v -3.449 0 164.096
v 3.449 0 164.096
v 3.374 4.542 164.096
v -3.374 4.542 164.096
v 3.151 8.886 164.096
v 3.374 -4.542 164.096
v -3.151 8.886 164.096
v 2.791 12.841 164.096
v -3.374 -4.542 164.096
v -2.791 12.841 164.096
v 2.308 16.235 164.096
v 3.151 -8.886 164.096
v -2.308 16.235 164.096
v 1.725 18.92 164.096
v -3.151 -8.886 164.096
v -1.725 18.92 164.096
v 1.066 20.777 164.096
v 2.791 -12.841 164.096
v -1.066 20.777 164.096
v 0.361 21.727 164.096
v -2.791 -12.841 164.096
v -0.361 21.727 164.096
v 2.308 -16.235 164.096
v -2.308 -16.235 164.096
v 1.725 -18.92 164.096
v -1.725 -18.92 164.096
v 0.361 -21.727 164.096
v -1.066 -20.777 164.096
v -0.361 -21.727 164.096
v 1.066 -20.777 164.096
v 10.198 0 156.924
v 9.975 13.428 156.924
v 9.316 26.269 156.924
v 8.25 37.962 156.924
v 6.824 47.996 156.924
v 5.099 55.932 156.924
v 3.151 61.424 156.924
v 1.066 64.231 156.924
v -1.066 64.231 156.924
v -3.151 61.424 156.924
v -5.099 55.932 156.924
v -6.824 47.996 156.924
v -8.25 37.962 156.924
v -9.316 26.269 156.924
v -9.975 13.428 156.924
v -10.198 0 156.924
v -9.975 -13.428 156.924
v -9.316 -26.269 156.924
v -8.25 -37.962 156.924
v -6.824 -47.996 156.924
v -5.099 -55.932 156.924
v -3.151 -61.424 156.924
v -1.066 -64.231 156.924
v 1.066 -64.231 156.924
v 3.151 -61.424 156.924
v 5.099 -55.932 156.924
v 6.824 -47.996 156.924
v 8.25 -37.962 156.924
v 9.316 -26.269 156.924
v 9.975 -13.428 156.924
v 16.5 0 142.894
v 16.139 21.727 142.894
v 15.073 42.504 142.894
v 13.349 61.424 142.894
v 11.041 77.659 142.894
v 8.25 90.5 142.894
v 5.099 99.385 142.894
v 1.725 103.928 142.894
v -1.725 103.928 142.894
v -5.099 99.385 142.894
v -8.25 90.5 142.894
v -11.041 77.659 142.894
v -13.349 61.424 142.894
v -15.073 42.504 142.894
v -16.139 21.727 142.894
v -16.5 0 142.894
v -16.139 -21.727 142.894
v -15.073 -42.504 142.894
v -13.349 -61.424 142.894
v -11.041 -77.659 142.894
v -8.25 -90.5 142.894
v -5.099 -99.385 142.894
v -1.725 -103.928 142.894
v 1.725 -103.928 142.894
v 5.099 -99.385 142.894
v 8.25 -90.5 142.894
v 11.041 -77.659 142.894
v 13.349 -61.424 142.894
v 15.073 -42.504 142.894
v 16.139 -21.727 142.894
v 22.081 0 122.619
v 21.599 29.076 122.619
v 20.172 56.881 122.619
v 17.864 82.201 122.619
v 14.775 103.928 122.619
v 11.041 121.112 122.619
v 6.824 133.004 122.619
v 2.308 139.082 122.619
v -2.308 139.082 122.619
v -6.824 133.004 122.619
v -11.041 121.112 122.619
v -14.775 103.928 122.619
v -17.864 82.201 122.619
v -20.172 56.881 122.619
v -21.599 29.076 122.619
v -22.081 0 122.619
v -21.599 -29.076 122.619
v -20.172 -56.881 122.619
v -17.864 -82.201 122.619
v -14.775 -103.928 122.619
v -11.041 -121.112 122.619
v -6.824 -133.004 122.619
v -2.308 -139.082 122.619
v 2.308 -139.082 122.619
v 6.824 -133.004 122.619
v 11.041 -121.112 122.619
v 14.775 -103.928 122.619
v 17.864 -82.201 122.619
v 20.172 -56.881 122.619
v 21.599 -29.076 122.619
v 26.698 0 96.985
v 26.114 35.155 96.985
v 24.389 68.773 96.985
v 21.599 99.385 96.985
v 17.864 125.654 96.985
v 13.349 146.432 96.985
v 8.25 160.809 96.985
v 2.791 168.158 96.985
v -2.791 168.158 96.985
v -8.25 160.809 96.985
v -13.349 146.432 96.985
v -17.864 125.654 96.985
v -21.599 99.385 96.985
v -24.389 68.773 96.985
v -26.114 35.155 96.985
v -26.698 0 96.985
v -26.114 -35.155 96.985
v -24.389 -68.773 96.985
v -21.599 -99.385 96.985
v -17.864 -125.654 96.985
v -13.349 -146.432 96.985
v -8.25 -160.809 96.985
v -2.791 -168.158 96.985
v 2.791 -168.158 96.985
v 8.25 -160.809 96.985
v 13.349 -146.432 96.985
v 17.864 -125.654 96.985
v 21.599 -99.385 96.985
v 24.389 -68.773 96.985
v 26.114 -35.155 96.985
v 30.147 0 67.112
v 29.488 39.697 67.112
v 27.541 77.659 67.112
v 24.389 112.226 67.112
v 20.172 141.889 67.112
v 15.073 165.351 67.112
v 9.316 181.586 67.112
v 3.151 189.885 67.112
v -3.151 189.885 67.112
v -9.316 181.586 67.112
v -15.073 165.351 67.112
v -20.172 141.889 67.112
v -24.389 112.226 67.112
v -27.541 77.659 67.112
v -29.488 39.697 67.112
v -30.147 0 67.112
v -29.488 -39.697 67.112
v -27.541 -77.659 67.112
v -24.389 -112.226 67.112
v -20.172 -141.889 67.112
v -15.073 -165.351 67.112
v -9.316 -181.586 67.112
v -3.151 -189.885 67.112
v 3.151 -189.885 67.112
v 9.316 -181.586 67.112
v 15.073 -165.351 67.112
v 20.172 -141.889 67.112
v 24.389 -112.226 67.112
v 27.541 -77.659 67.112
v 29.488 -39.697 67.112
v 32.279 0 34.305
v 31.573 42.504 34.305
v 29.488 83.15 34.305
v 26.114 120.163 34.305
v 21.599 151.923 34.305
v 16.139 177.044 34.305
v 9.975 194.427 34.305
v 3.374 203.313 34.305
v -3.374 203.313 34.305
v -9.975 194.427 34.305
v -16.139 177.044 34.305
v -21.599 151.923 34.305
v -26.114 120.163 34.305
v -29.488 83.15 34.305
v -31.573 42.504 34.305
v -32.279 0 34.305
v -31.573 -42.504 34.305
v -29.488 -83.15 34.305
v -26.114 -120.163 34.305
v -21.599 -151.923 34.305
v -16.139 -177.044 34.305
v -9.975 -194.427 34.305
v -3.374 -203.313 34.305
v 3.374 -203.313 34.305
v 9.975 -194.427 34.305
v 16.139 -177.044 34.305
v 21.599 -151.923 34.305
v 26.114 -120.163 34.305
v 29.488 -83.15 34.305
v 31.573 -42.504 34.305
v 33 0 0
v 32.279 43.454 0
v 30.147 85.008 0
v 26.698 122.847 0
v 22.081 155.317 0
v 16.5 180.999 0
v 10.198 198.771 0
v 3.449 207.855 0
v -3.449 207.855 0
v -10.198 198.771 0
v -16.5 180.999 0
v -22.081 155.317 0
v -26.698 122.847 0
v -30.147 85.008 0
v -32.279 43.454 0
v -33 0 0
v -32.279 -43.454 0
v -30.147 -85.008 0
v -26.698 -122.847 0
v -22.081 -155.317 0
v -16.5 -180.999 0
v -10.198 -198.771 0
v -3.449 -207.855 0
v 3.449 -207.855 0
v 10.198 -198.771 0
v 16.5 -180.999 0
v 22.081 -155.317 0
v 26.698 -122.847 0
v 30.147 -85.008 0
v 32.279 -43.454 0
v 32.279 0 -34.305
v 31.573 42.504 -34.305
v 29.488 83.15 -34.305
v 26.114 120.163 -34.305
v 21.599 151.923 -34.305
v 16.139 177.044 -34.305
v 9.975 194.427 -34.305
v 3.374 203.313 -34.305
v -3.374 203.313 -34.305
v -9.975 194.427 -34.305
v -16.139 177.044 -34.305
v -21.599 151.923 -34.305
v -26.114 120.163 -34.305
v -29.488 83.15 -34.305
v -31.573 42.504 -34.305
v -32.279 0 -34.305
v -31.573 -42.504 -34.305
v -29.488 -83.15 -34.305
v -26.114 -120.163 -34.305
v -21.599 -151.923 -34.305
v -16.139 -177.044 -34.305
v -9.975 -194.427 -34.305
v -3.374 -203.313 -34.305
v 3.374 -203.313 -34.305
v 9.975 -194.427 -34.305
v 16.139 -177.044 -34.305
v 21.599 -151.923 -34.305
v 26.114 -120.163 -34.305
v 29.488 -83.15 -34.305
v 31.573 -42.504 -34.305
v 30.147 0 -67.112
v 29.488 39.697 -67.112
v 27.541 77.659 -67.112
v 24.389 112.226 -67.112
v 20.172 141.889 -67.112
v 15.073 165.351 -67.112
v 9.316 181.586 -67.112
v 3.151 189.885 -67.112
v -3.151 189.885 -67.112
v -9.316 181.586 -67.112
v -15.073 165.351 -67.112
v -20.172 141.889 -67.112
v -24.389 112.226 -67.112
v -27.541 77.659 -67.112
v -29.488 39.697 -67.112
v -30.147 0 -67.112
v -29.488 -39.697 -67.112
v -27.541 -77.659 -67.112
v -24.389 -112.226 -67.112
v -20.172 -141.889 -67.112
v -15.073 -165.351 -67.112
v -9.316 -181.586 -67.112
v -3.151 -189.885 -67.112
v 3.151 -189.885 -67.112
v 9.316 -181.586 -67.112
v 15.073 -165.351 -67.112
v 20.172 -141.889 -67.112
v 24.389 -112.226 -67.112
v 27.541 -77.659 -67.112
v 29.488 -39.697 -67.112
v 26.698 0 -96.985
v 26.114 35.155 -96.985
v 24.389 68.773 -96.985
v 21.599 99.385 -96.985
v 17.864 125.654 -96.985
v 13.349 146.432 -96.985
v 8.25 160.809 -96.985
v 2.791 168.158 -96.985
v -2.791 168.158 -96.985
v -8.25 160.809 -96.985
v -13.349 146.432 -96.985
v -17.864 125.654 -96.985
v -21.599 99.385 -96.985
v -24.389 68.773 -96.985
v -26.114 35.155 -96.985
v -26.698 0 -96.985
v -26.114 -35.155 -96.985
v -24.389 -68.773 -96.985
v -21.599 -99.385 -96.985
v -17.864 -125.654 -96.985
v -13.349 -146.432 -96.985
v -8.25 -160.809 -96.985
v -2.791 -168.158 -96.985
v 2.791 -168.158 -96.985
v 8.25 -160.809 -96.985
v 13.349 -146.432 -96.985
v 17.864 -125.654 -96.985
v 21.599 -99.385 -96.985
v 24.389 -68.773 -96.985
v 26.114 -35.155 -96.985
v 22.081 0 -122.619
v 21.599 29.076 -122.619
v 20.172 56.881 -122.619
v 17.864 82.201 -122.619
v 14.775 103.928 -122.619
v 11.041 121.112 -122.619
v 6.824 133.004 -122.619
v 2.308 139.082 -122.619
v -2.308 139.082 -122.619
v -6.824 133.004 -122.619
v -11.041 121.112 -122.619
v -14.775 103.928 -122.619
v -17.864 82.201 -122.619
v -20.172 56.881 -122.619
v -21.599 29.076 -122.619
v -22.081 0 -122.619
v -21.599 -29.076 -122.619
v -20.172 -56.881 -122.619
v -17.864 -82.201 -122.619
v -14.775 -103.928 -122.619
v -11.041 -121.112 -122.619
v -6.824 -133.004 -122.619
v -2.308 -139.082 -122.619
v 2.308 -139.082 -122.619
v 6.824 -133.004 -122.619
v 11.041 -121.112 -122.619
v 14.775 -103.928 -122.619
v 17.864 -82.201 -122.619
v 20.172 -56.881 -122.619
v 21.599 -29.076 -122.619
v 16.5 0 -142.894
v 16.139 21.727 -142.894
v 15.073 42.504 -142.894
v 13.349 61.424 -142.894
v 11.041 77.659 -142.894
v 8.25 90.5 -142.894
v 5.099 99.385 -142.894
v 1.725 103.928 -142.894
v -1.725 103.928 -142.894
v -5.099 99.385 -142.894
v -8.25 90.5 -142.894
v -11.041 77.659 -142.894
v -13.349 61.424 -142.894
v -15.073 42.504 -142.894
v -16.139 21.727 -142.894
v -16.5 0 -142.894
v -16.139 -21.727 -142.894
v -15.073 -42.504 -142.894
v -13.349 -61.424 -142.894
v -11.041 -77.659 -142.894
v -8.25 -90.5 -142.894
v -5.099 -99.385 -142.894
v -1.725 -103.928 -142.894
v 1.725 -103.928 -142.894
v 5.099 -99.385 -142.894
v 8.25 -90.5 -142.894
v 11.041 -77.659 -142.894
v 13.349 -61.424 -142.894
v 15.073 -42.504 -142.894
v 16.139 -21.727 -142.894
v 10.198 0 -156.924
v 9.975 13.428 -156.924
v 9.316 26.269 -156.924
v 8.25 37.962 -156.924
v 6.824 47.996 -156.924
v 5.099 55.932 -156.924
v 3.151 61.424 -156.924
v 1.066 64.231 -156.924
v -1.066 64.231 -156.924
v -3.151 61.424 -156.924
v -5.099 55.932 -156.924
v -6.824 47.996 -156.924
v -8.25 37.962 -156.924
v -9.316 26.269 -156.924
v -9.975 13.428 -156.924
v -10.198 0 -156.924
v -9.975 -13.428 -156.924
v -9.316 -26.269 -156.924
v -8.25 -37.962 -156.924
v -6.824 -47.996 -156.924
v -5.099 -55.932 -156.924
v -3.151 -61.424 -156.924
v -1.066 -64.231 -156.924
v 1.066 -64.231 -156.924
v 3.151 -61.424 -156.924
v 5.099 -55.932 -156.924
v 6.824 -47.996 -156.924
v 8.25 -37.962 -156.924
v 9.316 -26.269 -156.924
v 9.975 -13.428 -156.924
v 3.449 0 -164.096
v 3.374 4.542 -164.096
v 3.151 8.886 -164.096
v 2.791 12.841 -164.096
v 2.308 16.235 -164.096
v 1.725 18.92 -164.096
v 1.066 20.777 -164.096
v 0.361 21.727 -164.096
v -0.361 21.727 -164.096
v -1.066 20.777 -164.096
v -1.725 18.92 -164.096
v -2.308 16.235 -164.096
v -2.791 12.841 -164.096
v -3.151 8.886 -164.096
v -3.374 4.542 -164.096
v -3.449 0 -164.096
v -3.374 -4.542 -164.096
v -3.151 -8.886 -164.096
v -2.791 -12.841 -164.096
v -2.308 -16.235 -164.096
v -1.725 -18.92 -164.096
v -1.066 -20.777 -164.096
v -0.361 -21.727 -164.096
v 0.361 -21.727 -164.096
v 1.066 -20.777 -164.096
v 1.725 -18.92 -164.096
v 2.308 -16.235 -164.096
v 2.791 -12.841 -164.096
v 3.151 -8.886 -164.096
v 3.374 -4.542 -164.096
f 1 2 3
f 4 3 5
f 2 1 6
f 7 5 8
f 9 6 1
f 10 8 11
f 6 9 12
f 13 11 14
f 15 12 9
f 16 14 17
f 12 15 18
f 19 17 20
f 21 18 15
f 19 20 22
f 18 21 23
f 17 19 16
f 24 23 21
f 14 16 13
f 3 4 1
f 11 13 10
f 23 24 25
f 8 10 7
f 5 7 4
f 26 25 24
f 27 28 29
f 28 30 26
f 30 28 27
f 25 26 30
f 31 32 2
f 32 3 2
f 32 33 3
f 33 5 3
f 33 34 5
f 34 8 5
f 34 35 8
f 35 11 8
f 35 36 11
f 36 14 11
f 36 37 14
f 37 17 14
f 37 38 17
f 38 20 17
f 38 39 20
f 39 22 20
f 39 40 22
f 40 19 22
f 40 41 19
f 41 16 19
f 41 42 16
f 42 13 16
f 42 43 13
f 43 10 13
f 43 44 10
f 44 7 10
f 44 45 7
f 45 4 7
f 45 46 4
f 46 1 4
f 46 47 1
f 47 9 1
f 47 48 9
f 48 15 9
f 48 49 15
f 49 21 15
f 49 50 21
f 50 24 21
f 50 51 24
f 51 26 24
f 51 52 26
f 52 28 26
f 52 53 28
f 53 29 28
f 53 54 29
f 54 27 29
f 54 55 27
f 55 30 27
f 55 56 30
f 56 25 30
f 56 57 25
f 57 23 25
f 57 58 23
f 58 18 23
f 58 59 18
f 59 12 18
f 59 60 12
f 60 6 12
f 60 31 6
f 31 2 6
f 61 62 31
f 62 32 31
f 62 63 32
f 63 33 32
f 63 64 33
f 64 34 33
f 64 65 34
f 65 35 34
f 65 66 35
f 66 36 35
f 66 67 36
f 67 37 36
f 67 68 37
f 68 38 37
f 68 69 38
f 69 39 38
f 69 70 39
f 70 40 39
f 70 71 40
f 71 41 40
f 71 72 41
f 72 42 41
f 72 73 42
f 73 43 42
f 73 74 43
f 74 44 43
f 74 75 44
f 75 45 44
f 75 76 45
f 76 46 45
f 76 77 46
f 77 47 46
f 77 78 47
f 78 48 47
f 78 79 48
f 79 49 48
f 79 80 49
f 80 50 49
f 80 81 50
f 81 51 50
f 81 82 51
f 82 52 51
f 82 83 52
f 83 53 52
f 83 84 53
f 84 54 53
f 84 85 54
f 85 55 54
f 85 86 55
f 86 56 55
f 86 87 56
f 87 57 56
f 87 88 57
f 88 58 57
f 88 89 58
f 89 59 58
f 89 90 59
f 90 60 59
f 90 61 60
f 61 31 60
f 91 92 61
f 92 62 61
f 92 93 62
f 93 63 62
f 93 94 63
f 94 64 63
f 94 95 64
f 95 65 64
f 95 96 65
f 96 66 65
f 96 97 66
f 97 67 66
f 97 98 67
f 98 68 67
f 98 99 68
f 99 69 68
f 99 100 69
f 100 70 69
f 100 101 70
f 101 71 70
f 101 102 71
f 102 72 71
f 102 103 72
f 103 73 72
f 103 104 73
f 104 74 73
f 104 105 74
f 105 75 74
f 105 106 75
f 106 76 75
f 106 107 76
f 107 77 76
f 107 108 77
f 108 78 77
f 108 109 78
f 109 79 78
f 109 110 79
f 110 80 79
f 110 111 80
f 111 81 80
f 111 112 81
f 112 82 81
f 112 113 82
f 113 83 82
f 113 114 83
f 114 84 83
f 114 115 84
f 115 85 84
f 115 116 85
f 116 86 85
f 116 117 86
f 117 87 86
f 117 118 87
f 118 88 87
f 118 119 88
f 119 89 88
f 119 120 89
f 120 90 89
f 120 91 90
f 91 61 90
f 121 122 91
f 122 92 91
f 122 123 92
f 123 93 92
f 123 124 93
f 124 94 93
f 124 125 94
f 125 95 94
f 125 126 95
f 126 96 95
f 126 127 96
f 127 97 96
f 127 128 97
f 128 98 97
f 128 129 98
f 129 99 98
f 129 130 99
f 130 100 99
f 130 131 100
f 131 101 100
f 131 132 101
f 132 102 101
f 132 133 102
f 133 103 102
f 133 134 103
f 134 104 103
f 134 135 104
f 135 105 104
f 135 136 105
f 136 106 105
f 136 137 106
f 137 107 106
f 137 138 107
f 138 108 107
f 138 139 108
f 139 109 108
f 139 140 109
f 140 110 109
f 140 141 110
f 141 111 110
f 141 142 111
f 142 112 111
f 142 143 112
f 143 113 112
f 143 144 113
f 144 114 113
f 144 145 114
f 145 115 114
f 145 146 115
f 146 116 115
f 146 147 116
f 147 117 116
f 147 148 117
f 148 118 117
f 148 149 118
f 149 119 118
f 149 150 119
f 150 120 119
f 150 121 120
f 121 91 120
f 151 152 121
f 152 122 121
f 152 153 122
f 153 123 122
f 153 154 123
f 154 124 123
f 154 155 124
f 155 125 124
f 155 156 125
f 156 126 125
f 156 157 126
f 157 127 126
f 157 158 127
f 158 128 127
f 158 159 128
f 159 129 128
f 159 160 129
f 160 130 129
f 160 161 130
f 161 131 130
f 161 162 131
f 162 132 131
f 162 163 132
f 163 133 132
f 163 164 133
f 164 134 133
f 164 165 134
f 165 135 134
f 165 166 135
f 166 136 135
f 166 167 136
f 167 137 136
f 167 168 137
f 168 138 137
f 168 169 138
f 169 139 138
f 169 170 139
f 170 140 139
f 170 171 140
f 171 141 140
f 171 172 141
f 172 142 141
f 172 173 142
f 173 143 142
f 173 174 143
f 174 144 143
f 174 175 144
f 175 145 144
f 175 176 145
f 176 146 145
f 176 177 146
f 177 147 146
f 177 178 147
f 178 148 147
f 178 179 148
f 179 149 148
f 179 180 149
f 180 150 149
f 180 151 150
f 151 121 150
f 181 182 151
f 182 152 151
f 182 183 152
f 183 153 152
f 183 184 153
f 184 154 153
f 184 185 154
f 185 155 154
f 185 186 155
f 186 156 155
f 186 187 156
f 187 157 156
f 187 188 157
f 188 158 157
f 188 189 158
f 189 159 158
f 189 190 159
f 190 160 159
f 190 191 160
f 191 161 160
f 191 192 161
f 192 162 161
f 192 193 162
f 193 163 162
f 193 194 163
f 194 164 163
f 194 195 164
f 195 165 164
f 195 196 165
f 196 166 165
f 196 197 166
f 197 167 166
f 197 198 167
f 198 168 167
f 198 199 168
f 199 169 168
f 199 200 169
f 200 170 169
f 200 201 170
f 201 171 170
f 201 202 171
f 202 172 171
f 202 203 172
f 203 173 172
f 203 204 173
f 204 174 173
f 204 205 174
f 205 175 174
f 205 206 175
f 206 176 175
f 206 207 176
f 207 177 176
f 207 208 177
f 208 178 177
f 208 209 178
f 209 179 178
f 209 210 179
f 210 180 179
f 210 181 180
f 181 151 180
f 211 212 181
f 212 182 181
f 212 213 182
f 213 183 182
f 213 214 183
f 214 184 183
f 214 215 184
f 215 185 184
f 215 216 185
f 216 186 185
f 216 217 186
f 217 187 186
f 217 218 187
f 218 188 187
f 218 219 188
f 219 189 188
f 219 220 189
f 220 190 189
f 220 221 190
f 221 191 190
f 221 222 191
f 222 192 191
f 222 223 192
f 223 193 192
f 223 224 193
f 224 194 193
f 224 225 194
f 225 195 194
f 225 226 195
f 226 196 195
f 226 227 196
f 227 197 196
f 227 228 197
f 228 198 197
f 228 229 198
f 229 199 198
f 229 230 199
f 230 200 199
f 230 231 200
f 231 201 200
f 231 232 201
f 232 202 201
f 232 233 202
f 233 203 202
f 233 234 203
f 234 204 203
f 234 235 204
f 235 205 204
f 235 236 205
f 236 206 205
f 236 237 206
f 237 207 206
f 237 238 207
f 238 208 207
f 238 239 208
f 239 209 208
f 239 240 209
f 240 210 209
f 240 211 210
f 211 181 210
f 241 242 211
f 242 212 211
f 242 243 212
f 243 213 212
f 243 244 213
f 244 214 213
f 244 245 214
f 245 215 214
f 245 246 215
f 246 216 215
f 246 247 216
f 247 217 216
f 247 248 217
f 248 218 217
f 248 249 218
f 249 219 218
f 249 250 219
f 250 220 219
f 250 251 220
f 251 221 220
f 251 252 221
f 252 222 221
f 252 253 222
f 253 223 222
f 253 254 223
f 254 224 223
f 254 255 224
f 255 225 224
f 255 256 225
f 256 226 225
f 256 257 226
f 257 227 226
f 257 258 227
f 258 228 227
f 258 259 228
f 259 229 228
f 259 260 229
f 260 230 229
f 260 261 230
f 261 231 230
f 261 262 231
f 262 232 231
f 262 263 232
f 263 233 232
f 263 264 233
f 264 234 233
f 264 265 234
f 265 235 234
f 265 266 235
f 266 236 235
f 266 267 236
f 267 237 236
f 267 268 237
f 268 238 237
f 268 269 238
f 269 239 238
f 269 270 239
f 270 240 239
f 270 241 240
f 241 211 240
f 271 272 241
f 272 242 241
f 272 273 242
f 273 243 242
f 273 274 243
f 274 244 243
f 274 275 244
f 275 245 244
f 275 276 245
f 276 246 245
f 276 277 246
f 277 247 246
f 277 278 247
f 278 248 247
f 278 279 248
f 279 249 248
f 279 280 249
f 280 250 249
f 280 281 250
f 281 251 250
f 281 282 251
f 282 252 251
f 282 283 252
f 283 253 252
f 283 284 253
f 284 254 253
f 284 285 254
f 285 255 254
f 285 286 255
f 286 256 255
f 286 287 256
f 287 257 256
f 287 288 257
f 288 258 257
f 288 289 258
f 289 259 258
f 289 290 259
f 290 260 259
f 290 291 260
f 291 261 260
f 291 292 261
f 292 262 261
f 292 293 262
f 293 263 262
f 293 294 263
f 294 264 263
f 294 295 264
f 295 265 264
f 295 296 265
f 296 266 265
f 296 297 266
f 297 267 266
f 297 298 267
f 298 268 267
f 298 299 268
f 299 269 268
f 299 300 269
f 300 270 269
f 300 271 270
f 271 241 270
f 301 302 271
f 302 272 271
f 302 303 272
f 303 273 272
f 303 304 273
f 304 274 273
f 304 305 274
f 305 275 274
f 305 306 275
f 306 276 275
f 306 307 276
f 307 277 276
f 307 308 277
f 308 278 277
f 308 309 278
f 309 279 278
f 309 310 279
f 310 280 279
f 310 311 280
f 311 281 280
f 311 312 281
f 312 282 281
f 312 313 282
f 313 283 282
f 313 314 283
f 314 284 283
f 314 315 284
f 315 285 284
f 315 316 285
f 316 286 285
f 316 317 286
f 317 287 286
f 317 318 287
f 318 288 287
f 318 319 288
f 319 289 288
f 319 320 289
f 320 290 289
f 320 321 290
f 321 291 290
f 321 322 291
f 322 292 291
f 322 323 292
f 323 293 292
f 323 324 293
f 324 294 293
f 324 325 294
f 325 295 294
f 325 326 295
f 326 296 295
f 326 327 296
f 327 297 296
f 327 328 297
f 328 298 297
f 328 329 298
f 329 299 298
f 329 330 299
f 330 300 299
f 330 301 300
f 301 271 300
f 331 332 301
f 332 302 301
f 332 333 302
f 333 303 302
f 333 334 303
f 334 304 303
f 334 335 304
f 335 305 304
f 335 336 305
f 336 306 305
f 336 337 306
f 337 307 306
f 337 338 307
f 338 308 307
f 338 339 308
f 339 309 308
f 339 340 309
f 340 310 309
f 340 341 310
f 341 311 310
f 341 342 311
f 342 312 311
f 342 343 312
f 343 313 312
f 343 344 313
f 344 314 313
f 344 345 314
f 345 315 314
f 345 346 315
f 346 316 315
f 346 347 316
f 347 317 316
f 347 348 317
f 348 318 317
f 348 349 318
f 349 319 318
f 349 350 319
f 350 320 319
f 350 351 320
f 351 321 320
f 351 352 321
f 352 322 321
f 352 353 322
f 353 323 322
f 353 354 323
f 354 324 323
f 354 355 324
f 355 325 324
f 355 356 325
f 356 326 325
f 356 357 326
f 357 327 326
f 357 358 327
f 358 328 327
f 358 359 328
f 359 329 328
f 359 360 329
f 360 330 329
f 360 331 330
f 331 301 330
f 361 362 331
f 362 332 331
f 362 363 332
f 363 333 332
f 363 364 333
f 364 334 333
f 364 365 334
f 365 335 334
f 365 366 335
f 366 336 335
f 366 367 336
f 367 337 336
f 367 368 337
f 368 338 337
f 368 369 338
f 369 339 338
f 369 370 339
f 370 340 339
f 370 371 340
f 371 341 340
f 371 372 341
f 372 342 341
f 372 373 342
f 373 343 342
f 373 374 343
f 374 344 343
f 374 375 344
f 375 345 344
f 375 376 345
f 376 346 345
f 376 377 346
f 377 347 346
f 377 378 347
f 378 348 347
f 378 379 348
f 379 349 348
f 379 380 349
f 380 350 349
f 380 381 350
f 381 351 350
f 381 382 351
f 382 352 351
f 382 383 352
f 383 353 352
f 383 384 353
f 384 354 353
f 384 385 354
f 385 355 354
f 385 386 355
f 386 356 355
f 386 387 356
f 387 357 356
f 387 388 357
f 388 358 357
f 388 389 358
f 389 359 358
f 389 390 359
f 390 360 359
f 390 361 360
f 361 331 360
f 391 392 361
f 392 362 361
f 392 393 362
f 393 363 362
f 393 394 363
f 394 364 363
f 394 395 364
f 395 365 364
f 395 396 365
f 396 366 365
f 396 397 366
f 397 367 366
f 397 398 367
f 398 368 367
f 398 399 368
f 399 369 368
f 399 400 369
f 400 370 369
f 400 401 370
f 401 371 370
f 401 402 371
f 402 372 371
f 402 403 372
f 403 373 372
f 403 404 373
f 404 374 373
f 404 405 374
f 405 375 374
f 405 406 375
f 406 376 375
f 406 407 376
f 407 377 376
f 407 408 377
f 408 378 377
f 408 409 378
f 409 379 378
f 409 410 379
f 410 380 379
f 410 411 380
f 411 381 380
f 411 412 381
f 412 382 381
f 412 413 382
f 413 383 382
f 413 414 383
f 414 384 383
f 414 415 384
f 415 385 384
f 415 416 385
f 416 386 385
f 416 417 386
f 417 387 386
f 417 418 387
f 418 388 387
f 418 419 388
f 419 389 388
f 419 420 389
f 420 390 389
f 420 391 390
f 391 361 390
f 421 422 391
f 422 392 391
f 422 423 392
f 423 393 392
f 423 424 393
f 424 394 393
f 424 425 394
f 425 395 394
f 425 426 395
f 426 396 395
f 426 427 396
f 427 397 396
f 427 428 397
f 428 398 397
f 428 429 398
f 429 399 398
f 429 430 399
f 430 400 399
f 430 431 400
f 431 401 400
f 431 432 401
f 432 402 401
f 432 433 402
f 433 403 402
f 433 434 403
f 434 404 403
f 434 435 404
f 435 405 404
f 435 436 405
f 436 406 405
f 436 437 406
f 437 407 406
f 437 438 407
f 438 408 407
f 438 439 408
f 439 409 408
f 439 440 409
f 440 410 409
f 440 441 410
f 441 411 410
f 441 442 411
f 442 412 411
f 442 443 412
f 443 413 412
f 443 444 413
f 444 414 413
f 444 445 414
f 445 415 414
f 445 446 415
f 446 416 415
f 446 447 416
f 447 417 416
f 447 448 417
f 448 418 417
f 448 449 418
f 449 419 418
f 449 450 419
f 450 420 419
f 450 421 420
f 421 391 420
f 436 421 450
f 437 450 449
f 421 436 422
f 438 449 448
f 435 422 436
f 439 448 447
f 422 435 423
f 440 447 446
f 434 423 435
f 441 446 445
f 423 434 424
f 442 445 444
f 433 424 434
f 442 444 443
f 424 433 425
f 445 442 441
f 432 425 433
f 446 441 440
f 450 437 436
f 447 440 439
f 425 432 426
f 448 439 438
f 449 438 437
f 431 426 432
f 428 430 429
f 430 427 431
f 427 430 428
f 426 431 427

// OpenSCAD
// Generated by SolidPython 1.0.1 on 2020-07-29 00:46:46


scale(v = [3, 19, 15]) {
	sphere(r = 11);
}
/***********************************************
*********      SolidPython code:      **********
************************************************
 
# import packages: SolidPython
from solid import *
from solid.utils import *
from itertools import chain, combinations, permutations


class Resize:

    def __init__(self, scad_file):
        self.scad_file = scad_file
        #self.scad_file = import_scad(scad_file)
        # cone/cylinder param:
        self.r1 = 0
        self.r2 = 0
        self.h = 0
        # rectangular prism param:
        self.w = 0
        self.l = 0
        # ellipse param:
        self.r = 0

    # import OpenScad code (file name corresponds to shape)


    # classify shape + parameters
    def assign(self, param1, param2, param3):
        if self.scad_file == 'cone.scad':
            self.r1 = param1
            self.r2 = param2
            self.h = param3
        elif self.scad_file == 'cylinder.scad':
            self.r1 = param1
            self.r2 = param2
            self.h = param3
        elif self.scad_file == 'rectangularPrism.scad':
            self.h = param1
            self.l = param2
            self.w = param3
        else:
            self.r = param1
            self.h = param2

    # resize parameters
    def iterate(self):
        x = range(3, 20, 2)
        i = 1
        if self.scad_file == 'cone.scad':
            tempList = list(permutations(x, 2))
            for temp in tempList:
                param1 = temp[0]
                param2 = temp[1]
                filepath = 'produced_scad_files/' + 'cone' + str(param1) + '_' + str(param2) + '_' + '.scad'
                scad_render_to_file(cylinder(h=param1, r1=param2, r2=0), filepath)

        elif self.scad_file == 'cylinder.scad':
            tempList = list(permutations(x, 3))
            for temp in tempList:
                param1 = temp[0]
                param2 = temp[1]
                filepath = 'produced_scad_files/' + 'cylinder' + str(param1) + '_' + str(param2) + '_' + '.scad'
                scad_render_to_file(cylinder(h=param1, r1=param2, r2=param2), filepath)

        elif self.scad_file == 'rectangularPrism.scad':
            tempList = list(permutations(x, 3))
            for temp in tempList:
                param1 = temp[0]
                param2 = temp[1]
                param3 = temp[2]
                filepath = 'produced_scad_files/' + 'rectangularPrism' + str(param1) + '_' + str(param2) + '_' + str(
                    param3) + '.scad'
                scad_render_to_file(cube(size=(param1, param2, param3)), filepath)

        elif self.scad_file == 'ellipse.scad':
            tempList = list(permutations(x, 4))
            for temp in tempList:
                param1 = temp[0]
                param2 = temp[1]
                param3 = temp[2]
                param4 = temp[3]
                filepath = 'produced_scad_files/' + 'ellipse' + str(param1) + '_' + str(param2) + '_' + str(param3) + '_' + str(param4) + '.scad'
                scad_render_to_file(scale([param1, param2, param3])(sphere(r=param4)), filepath)

    def render_to_scadfile(self):
        scad_render_to_file(scad, 'example.scad') 
 
************************************************/
